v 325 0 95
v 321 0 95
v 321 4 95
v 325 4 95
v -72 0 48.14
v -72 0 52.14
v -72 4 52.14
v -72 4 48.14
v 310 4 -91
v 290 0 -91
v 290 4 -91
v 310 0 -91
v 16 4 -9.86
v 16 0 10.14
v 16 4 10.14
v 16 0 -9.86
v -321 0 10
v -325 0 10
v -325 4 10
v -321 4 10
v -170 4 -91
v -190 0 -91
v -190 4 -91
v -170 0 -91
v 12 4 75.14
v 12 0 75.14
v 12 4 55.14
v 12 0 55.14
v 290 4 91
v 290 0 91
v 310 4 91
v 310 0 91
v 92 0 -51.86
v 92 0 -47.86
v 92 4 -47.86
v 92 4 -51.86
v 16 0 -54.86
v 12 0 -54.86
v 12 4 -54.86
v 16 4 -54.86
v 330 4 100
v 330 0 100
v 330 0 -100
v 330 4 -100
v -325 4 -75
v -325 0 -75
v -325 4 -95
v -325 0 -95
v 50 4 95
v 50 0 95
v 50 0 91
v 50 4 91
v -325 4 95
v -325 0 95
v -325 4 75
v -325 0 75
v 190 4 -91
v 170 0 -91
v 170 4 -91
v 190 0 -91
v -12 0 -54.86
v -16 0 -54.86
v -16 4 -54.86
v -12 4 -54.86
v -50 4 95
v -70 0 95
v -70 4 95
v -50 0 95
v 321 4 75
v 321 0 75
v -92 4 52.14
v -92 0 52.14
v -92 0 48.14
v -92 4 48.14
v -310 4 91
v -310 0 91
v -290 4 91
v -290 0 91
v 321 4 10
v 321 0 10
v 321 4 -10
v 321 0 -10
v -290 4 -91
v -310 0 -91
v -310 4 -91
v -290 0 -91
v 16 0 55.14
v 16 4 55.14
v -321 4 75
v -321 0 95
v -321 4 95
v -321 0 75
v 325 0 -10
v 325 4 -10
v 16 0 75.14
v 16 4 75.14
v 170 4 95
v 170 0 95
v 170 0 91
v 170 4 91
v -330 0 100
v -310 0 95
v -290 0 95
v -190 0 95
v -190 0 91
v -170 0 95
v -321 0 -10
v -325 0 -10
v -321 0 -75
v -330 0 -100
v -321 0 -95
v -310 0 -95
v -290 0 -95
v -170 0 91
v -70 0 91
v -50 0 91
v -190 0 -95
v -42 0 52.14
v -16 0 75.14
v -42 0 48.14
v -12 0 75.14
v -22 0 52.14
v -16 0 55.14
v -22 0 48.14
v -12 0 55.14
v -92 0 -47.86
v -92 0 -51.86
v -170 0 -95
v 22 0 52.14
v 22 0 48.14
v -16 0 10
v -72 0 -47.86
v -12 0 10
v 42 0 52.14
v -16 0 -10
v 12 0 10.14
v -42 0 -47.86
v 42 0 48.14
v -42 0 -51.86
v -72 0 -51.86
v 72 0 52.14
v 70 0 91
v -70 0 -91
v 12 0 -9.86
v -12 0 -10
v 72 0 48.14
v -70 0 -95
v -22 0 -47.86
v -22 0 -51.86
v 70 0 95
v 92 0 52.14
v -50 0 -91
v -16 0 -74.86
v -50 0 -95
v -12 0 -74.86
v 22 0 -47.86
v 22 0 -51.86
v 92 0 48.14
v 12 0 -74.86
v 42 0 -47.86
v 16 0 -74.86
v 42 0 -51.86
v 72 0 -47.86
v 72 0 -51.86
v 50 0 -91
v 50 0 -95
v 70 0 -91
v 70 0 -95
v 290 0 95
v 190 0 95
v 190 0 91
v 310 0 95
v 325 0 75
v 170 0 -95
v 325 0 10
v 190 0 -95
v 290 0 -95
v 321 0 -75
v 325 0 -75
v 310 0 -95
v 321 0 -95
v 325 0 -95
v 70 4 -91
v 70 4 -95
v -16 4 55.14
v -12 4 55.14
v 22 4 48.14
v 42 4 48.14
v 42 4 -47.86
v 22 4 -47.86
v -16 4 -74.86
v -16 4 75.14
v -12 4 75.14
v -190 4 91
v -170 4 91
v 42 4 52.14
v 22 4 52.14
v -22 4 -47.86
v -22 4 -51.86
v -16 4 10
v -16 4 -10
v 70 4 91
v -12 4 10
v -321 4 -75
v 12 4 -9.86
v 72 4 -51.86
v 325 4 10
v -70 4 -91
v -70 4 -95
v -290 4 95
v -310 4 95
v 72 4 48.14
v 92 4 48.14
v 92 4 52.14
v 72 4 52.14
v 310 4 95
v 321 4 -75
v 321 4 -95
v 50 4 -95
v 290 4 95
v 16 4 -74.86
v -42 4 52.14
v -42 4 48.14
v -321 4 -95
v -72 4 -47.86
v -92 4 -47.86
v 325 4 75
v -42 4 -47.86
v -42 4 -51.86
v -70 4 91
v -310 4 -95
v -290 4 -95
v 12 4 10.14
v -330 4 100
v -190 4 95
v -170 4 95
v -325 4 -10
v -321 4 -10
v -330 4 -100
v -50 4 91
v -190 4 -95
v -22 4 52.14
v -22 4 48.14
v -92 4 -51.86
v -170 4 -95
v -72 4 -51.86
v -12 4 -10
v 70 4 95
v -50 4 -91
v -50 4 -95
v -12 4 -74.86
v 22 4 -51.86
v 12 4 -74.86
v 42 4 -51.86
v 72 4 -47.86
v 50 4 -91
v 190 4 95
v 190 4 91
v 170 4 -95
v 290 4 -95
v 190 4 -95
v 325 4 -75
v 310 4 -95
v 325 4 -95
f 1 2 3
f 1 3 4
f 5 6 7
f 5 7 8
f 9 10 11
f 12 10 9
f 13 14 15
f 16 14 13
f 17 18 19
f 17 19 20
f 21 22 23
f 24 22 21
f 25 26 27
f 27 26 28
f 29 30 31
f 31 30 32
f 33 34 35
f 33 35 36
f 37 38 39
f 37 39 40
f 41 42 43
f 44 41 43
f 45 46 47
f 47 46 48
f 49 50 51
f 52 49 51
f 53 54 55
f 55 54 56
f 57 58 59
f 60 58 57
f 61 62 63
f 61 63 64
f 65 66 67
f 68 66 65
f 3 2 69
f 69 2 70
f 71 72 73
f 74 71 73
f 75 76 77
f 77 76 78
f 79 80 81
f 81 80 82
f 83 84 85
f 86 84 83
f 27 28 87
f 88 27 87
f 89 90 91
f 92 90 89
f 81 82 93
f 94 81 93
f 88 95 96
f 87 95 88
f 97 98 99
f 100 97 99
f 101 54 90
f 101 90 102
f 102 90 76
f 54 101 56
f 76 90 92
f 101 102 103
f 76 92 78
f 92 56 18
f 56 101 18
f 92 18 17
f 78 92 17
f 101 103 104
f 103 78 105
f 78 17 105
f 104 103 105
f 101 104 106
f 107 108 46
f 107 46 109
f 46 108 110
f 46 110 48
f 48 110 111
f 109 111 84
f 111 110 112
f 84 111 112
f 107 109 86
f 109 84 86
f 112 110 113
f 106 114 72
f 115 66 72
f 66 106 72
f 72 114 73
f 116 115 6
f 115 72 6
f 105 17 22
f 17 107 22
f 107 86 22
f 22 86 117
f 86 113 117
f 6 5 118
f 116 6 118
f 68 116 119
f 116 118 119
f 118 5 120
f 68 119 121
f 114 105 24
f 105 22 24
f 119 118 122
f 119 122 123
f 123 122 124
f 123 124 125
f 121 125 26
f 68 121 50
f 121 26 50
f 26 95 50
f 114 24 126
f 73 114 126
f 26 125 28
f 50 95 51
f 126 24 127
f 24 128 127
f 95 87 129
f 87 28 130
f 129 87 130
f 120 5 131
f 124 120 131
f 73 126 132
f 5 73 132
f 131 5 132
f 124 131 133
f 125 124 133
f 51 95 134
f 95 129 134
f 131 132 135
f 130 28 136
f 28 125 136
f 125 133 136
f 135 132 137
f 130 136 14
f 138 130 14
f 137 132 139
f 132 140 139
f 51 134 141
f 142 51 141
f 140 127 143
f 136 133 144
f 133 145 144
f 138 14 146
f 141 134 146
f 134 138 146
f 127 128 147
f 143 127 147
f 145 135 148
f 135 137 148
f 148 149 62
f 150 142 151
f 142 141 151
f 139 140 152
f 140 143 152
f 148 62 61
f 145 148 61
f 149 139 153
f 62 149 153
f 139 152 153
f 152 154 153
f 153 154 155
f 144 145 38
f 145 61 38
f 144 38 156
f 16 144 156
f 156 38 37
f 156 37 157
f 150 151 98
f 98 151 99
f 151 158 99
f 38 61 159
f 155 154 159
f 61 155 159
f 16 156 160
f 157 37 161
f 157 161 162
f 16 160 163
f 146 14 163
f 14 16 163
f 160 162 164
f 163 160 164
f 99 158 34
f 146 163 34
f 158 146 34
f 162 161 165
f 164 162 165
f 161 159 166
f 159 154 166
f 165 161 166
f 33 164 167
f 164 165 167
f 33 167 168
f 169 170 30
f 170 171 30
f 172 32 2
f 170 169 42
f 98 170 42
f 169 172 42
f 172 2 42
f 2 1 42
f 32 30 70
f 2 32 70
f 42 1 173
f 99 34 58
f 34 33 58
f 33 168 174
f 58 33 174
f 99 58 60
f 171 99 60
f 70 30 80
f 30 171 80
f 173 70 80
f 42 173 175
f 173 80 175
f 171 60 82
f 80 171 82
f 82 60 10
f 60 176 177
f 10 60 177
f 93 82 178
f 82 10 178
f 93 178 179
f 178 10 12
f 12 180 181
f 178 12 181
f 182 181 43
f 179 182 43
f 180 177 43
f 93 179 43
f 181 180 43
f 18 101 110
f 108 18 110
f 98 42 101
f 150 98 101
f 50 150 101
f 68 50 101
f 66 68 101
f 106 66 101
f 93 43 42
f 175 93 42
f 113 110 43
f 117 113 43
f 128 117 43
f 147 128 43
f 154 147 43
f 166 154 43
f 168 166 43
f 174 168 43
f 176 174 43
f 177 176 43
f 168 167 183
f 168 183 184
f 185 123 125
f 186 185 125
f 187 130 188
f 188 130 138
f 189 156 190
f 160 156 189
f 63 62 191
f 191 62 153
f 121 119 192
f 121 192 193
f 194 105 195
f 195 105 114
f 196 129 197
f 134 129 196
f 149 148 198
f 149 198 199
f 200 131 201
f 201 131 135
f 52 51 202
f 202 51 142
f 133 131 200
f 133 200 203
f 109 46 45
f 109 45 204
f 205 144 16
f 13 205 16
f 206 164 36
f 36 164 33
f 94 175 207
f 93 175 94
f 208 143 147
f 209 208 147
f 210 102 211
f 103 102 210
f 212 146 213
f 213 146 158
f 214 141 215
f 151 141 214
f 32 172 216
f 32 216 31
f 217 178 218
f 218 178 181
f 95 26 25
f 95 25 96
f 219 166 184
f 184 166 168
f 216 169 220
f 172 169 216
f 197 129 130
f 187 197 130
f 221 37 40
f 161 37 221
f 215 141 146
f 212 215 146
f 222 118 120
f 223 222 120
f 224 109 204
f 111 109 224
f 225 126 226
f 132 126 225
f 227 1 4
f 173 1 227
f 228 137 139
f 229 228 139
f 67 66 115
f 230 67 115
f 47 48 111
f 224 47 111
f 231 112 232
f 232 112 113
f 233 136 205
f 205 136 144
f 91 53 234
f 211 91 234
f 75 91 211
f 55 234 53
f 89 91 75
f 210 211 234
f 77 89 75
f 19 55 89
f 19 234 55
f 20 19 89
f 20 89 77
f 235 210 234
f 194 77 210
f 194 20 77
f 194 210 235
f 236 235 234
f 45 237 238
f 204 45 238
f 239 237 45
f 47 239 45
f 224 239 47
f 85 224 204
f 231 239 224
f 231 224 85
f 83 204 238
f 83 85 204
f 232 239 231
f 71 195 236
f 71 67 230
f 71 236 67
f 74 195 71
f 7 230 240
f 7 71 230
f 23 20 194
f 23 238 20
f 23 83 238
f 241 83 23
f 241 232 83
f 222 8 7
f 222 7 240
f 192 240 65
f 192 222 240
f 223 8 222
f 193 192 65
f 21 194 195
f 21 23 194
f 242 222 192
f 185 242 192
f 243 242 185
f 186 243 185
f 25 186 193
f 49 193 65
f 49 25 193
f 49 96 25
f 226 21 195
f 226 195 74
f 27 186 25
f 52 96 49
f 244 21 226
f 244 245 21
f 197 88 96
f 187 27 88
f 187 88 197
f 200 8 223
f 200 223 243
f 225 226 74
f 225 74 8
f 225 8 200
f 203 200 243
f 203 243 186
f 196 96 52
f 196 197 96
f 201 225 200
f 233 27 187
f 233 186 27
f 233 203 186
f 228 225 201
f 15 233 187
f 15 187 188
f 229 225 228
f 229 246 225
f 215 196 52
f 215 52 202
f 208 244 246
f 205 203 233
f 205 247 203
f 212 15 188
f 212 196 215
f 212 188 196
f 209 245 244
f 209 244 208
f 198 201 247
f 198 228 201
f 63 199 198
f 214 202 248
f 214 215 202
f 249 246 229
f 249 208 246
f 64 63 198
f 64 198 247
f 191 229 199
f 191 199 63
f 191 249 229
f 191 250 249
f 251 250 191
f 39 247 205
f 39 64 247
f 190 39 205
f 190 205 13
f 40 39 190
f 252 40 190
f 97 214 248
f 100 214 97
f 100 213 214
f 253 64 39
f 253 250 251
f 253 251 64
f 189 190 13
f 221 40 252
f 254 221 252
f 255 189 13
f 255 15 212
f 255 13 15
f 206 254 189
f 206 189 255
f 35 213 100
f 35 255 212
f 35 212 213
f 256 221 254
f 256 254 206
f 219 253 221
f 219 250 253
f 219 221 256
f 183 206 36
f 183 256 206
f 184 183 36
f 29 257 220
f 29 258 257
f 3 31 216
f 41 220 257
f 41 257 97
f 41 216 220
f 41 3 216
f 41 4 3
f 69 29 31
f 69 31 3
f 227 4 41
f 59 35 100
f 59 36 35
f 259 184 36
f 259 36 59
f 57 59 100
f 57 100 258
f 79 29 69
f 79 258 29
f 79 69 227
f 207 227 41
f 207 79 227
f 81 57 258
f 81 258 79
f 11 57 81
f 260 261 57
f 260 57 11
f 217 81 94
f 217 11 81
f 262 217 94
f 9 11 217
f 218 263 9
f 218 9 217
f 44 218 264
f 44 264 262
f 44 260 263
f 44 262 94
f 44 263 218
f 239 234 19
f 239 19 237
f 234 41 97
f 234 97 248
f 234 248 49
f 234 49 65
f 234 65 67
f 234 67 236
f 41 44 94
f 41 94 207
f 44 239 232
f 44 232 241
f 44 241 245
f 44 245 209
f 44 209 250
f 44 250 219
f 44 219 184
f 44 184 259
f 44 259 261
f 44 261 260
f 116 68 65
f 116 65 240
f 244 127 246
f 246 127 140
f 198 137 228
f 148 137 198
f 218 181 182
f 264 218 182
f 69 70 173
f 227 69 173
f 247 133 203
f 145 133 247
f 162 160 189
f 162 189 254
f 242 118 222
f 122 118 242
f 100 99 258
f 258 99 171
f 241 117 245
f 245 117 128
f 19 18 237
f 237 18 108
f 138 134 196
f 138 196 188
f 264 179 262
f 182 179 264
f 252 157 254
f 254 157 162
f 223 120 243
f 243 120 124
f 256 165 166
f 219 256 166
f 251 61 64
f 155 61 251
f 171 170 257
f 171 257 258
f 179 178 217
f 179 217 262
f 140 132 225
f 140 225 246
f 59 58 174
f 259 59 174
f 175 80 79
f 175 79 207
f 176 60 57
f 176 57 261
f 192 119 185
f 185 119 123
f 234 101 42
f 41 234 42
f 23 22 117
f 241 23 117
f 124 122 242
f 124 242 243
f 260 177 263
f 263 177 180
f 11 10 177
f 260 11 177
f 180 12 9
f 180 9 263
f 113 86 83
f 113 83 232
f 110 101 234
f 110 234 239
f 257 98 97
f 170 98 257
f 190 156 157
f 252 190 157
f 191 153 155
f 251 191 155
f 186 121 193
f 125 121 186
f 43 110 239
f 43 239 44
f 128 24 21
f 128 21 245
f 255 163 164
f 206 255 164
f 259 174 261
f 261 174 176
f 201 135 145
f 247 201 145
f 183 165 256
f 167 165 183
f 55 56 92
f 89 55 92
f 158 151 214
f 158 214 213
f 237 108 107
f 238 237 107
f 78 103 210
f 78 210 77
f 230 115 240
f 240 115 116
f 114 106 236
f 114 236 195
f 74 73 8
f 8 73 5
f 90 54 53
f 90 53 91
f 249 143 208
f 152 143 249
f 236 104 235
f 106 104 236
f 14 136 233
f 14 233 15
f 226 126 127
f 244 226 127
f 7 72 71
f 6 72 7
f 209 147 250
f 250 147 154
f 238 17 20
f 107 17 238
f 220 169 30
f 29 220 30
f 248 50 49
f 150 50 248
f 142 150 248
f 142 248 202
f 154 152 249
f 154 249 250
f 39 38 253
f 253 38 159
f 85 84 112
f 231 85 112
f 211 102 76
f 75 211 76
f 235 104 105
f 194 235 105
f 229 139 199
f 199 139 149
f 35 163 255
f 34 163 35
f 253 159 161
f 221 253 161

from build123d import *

# Parameters (mm, degrees)
SKETCH1_W           = 660
SKETCH1_H           = 200
SKETCH1_W_2         = 20
SKETCH1_H_2         = 4
SKETCH1_W_3         = 4
SKETCH1_H_3         = 20
BOSS_EXTRUDE1_DEPTH = 4


with BuildPart() as part:
    # Sketch1 → Boss-Extrude1 (new body)
    with BuildSketch(Plane(origin=(0, 0, 0), x_dir=(1, 0, 0), z_dir=(0, 1, 0))):
        Rectangle(SKETCH1_W, SKETCH1_H)
        with Locations((-82, 49.859697176)):
            Rectangle(SKETCH1_W_2, SKETCH1_H_2, mode=Mode.SUBTRACT)
        with Locations((-32, 49.859697176)):
            Rectangle(SKETCH1_W_2, SKETCH1_H_2, mode=Mode.SUBTRACT)
        with Locations((-82, -50.140302824)):
            Rectangle(SKETCH1_W_2, SKETCH1_H_2, mode=Mode.SUBTRACT)
        with Locations((-32, -50.140302824)):
            Rectangle(SKETCH1_W_2, SKETCH1_H_2, mode=Mode.SUBTRACT)
        with Locations((-14, 64.859697176)):
            Rectangle(SKETCH1_W_3, SKETCH1_H_3, mode=Mode.SUBTRACT)
        with Locations((14, 64.859697176)):
            Rectangle(SKETCH1_W_3, SKETCH1_H_3, mode=Mode.SUBTRACT)
        with Locations((32, 49.859697176)):
            Rectangle(SKETCH1_W_2, SKETCH1_H_2, mode=Mode.SUBTRACT)
        with Locations((82, 49.859697176)):
            Rectangle(SKETCH1_W_2, SKETCH1_H_2, mode=Mode.SUBTRACT)
        with Locations((-14, 0)):
            Rectangle(SKETCH1_W_3, SKETCH1_H_3, mode=Mode.SUBTRACT)
        with Locations((14, -0.140302824)):
            Rectangle(SKETCH1_W_3, SKETCH1_H_3, mode=Mode.SUBTRACT)
        with Locations((32, -50.140302824)):
            Rectangle(SKETCH1_W_2, SKETCH1_H_2, mode=Mode.SUBTRACT)
        with Locations((14, -65.140302824)):
            Rectangle(SKETCH1_W_3, SKETCH1_H_3, mode=Mode.SUBTRACT)
        with Locations((82, -50.140302824)):
            Rectangle(SKETCH1_W_2, SKETCH1_H_2, mode=Mode.SUBTRACT)
        with Locations((-323, -85)):
            Rectangle(SKETCH1_W_3, SKETCH1_H_3, mode=Mode.SUBTRACT)
        with Locations((-323, 85)):
            Rectangle(SKETCH1_W_3, SKETCH1_H_3, mode=Mode.SUBTRACT)
        with Locations((323, -85)):
            Rectangle(SKETCH1_W_3, SKETCH1_H_3, mode=Mode.SUBTRACT)
        with Locations((-323, 0)):
            Rectangle(SKETCH1_W_3, SKETCH1_H_3, mode=Mode.SUBTRACT)
        with Locations((323, 0)):
            Rectangle(SKETCH1_W_3, SKETCH1_H_3, mode=Mode.SUBTRACT)
        with Locations((323, 85)):
            Rectangle(SKETCH1_W_3, SKETCH1_H_3, mode=Mode.SUBTRACT)
        with Locations((-300, 93)):
            Rectangle(SKETCH1_W_2, SKETCH1_H_2, mode=Mode.SUBTRACT)
        with Locations((-180, 93)):
            Rectangle(SKETCH1_W_2, SKETCH1_H_2, mode=Mode.SUBTRACT)
        with Locations((-60, 93)):
            Rectangle(SKETCH1_W_2, SKETCH1_H_2, mode=Mode.SUBTRACT)
        with Locations((300, 93)):
            Rectangle(SKETCH1_W_2, SKETCH1_H_2, mode=Mode.SUBTRACT)
        with Locations((-14, -65.140302824)):
            Rectangle(SKETCH1_W_3, SKETCH1_H_3, mode=Mode.SUBTRACT)
        with Locations((180, 93)):
            Rectangle(SKETCH1_W_2, SKETCH1_H_2, mode=Mode.SUBTRACT)
        with Locations((60, 93)):
            Rectangle(SKETCH1_W_2, SKETCH1_H_2, mode=Mode.SUBTRACT)
        with Locations((300, -93)):
            Rectangle(SKETCH1_W_2, SKETCH1_H_2, mode=Mode.SUBTRACT)
        with Locations((180, -93)):
            Rectangle(SKETCH1_W_2, SKETCH1_H_2, mode=Mode.SUBTRACT)
        with Locations((60, -93)):
            Rectangle(SKETCH1_W_2, SKETCH1_H_2, mode=Mode.SUBTRACT)
        with Locations((-60, -93)):
            Rectangle(SKETCH1_W_2, SKETCH1_H_2, mode=Mode.SUBTRACT)
        with Locations((-180, -93)):
            Rectangle(SKETCH1_W_2, SKETCH1_H_2, mode=Mode.SUBTRACT)
        with Locations((-300, -93)):
            Rectangle(SKETCH1_W_2, SKETCH1_H_2, mode=Mode.SUBTRACT)
    extrude(amount=BOSS_EXTRUDE1_DEPTH)


solid = part.part
